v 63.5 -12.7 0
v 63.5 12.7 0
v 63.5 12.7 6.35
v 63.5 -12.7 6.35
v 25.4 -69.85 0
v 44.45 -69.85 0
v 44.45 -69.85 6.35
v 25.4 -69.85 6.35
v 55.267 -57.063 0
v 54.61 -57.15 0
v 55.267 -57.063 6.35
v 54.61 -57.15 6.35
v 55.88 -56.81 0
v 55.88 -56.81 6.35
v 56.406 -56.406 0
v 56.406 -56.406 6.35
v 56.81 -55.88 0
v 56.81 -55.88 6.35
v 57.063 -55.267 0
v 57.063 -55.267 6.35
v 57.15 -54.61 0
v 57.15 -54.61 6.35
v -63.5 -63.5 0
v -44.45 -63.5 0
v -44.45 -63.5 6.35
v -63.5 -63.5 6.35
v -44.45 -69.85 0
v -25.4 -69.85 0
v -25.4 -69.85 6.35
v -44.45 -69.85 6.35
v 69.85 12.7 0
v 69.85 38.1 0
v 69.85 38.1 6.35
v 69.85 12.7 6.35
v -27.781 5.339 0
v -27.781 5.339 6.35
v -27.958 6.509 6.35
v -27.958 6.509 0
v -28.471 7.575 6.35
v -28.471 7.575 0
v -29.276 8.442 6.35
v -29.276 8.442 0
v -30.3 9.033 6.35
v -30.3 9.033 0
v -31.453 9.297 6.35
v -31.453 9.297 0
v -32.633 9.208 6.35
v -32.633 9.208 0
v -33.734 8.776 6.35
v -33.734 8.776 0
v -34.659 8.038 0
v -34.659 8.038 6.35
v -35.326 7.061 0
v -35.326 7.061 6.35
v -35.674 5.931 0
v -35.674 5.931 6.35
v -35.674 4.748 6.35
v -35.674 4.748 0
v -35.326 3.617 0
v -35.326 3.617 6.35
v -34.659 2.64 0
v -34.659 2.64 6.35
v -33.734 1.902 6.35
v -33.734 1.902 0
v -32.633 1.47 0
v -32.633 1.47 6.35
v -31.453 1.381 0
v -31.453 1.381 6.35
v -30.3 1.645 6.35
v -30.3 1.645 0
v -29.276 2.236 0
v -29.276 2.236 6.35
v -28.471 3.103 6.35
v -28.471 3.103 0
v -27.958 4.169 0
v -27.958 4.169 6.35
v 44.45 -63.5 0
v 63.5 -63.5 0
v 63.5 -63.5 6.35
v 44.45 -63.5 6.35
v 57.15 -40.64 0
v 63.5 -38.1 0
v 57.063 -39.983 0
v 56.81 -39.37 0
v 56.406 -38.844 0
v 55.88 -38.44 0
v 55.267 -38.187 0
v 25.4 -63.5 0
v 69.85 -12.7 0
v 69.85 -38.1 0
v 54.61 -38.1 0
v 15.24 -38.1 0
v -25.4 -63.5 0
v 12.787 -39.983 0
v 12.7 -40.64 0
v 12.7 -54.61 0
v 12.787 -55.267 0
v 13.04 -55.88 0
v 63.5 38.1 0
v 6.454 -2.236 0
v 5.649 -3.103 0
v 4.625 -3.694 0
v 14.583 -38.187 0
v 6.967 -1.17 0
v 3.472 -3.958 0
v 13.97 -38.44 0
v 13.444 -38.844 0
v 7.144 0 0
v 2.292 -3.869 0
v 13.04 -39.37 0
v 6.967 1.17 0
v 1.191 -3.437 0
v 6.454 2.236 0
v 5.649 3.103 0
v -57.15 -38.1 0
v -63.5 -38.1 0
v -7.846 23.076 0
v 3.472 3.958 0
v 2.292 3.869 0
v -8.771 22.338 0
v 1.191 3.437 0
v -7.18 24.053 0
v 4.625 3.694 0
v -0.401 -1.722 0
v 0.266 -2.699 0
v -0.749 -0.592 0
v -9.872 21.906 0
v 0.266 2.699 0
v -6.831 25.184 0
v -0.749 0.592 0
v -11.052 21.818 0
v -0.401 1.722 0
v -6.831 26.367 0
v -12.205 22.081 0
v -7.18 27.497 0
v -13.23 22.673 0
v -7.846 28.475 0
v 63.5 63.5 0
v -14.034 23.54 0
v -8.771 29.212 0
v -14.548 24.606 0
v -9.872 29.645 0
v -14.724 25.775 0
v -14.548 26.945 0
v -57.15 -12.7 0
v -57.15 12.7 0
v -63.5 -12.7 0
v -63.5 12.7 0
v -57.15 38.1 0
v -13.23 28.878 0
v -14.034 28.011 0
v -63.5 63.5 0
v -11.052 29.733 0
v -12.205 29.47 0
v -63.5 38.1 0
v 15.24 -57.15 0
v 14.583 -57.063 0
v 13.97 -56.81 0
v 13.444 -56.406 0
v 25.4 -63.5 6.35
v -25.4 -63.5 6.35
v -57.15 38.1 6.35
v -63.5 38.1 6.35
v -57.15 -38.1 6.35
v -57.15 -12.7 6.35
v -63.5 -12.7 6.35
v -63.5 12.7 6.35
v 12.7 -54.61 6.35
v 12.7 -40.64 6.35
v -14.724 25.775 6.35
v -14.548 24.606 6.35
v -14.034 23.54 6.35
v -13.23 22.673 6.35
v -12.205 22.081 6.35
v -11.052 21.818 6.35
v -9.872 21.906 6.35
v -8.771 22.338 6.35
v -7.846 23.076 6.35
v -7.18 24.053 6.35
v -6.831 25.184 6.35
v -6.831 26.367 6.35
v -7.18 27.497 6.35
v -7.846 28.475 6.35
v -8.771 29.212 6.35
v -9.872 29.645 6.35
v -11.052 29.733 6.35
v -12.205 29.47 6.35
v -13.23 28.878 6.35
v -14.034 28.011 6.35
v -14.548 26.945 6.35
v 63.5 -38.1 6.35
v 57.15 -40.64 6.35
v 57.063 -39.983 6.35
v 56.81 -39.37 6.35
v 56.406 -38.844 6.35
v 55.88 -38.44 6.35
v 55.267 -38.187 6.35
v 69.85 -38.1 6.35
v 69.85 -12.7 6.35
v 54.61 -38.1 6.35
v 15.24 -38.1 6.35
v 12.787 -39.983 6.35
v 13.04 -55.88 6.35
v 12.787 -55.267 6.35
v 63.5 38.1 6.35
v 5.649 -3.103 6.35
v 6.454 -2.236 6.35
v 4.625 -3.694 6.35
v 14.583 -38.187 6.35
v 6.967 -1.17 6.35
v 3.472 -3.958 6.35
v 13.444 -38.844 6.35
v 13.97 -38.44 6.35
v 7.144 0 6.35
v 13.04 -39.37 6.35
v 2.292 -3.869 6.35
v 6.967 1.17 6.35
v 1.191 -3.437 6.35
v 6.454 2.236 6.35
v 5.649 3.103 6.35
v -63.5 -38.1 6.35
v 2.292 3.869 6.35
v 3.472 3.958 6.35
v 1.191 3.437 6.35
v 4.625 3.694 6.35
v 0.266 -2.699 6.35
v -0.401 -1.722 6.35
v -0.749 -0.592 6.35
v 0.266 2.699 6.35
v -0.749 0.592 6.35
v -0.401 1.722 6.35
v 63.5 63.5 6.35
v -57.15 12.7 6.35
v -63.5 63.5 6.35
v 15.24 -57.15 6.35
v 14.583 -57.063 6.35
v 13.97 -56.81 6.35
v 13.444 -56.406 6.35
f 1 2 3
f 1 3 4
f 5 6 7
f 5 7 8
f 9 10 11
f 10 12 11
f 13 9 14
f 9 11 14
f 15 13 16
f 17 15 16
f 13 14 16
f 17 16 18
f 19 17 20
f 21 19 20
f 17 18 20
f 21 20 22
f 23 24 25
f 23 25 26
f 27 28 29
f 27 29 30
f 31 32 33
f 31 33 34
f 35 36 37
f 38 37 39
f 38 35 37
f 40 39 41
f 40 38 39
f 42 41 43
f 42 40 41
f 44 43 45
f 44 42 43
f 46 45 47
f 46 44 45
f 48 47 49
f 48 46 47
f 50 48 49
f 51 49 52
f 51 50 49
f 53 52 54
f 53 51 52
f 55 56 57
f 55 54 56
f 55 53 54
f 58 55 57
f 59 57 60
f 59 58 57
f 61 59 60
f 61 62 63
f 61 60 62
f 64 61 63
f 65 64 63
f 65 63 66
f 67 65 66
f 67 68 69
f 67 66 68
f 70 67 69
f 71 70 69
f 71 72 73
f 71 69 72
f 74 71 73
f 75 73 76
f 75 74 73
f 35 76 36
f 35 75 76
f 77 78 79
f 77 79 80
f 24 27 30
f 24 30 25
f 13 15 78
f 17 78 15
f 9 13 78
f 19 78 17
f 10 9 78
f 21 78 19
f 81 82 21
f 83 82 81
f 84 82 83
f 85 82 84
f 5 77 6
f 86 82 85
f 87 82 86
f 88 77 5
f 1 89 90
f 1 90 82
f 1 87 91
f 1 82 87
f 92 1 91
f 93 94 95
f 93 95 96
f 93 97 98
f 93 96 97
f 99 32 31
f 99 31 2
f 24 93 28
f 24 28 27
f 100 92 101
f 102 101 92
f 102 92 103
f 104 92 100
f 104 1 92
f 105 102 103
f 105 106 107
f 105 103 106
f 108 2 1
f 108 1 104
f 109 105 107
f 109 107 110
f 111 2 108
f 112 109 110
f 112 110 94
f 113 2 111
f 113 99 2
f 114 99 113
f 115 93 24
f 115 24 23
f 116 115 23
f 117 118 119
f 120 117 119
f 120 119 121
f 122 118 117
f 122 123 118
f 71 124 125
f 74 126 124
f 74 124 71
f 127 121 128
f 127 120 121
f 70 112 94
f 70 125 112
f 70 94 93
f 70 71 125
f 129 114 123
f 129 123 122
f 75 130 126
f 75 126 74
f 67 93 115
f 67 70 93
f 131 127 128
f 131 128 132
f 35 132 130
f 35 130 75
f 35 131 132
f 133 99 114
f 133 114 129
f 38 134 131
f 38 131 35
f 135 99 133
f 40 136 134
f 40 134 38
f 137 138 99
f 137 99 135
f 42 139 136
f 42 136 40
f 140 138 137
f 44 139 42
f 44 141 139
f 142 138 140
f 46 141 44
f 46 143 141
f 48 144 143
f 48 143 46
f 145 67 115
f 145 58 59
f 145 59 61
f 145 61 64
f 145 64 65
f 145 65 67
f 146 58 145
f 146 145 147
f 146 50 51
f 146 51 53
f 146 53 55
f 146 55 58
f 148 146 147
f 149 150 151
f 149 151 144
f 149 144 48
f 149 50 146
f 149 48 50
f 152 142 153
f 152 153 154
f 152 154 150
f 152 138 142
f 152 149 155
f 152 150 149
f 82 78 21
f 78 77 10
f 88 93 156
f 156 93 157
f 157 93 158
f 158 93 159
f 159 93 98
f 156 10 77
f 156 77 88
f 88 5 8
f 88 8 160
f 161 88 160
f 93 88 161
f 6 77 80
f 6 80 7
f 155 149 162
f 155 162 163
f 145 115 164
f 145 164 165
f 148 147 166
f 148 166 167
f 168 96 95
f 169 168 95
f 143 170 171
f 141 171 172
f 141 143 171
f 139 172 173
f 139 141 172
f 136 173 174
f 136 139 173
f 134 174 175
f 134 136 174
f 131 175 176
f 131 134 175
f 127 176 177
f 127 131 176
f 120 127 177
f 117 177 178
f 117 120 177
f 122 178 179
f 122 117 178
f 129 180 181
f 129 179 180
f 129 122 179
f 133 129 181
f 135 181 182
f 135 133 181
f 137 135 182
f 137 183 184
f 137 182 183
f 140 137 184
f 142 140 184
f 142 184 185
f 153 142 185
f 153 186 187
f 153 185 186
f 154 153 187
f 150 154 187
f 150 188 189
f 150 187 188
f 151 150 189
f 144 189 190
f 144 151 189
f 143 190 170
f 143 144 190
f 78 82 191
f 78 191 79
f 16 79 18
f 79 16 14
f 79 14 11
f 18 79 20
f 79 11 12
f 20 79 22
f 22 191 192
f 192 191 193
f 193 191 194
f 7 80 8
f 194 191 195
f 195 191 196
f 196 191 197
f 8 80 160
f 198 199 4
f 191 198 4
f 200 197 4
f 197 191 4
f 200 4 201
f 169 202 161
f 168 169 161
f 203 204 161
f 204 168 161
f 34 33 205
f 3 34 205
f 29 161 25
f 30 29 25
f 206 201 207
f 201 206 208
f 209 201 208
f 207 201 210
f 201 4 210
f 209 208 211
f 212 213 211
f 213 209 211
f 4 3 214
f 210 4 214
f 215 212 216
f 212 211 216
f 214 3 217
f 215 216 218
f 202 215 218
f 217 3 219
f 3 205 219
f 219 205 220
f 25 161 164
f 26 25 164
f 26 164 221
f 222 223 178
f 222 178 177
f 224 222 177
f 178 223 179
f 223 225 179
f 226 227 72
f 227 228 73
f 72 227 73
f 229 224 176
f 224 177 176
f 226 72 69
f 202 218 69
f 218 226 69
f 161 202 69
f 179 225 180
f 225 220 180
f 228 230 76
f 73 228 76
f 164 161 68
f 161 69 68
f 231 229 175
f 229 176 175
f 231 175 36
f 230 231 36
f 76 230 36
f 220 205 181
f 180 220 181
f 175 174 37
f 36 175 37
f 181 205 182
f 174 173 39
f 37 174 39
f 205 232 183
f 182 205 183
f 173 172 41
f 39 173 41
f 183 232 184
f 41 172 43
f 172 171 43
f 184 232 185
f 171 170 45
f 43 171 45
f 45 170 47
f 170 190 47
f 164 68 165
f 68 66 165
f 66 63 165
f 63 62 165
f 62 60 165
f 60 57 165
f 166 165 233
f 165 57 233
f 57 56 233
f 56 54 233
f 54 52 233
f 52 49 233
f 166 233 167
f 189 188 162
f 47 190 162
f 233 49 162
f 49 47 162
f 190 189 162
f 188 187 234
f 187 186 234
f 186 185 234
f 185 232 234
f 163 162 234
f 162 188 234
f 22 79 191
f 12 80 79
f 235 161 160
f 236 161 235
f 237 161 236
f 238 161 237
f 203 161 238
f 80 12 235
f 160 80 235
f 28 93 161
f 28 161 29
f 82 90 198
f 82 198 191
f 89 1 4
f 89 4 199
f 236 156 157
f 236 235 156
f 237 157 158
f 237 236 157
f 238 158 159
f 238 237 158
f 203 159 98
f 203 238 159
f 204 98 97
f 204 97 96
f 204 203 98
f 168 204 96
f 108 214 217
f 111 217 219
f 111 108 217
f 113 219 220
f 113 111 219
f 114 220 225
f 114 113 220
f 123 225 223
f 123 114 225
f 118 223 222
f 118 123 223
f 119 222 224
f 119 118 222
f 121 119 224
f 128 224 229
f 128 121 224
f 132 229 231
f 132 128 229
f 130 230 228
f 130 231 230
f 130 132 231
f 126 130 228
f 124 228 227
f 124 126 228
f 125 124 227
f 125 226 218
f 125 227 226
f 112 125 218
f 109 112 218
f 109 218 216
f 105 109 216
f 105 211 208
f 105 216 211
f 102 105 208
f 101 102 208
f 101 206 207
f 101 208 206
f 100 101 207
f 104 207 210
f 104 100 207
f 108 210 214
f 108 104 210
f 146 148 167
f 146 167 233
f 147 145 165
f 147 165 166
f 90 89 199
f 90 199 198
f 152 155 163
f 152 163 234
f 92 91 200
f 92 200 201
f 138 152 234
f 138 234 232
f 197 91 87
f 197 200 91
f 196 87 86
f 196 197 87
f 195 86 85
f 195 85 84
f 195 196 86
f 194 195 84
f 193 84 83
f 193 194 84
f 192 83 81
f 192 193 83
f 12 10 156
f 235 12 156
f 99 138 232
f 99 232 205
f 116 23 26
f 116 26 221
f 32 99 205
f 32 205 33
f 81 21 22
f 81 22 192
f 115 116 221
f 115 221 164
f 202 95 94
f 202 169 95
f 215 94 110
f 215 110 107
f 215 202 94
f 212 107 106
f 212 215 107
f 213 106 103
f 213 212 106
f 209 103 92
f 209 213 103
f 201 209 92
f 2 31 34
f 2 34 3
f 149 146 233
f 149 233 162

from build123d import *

# Parameters (mm, degrees)
BOXSIDE_DEPTH      = 6.35
SKETCH2_R          = 3.96875
CUT_EXTRUDE1_DEPTH = 99.986703653
SKETCH3_W          = 44.45
SKETCH3_H          = 19.05
CUT_EXTRUDE2_DEPTH = 99.986703653
FILLET1_R          = 2.54


with BuildPart() as part:
    # Sketch1 → BOXSIDE (new body)
    with BuildSketch(Plane.XY):
        Polygon((-63.5, 38.1), (-63.5, 63.5), (63.5, 63.5), (63.5, 38.1), (69.85, 38.1), (69.85, 12.7), (63.5, 12.7), (63.5, -12.7), (69.85, -12.7), (69.85, -38.1), (63.5, -38.1), (63.5, -63.5), (44.45, -63.5), (44.45, -69.85), (25.4, -69.85), (25.4, -63.5), (-25.4, -63.5), (-25.4, -69.85), (-44.45, -69.85), (-44.45, -63.5), (-63.5, -63.5), (-63.5, -38.1), (-57.15, -38.1), (-57.15, -12.7), (-63.5, -12.7), (-63.5, 12.7), (-57.15, 12.7), (-57.15, 38.1), align=None)
    extrude(amount=BOXSIDE_DEPTH)

    # Sketch2 → Cut-Extrude1 (cut, through all)
    with BuildSketch(Plane.XY):
        with Locations(Location((-10.755250883, 25.77544668, 0), (0, 0, 180))):
            Circle(SKETCH2_R)
        with Locations((3.175, 0)):
            Circle(SKETCH2_R)
        with Locations((-31.75, 5.339056325)):
            Circle(SKETCH2_R)
    extrude(amount=CUT_EXTRUDE1_DEPTH, mode=Mode.SUBTRACT)

    # Sketch3 → Cut-Extrude2 (cut, through all)
    with BuildSketch(Plane(origin=(0, 0, 0), x_dir=(-1, 0, 0), z_dir=(0, 0, -1))):
        with Locations((-34.925, -47.625)):
            Rectangle(SKETCH3_W, SKETCH3_H)
    extrude(amount=-CUT_EXTRUDE2_DEPTH, mode=Mode.SUBTRACT)

    # Fillet1
    fillet1_edges = [part.edges().sort_by_distance(p)[0] for p in [
        (57.15, -57.15, 3.175),
        (57.15, -38.1, 3.175),
        (12.7, -38.1, 3.175),
        (12.7, -57.15, 3.175),
    ]]
    fillet(fillet1_edges, radius=FILLET1_R)


solid = part.part
